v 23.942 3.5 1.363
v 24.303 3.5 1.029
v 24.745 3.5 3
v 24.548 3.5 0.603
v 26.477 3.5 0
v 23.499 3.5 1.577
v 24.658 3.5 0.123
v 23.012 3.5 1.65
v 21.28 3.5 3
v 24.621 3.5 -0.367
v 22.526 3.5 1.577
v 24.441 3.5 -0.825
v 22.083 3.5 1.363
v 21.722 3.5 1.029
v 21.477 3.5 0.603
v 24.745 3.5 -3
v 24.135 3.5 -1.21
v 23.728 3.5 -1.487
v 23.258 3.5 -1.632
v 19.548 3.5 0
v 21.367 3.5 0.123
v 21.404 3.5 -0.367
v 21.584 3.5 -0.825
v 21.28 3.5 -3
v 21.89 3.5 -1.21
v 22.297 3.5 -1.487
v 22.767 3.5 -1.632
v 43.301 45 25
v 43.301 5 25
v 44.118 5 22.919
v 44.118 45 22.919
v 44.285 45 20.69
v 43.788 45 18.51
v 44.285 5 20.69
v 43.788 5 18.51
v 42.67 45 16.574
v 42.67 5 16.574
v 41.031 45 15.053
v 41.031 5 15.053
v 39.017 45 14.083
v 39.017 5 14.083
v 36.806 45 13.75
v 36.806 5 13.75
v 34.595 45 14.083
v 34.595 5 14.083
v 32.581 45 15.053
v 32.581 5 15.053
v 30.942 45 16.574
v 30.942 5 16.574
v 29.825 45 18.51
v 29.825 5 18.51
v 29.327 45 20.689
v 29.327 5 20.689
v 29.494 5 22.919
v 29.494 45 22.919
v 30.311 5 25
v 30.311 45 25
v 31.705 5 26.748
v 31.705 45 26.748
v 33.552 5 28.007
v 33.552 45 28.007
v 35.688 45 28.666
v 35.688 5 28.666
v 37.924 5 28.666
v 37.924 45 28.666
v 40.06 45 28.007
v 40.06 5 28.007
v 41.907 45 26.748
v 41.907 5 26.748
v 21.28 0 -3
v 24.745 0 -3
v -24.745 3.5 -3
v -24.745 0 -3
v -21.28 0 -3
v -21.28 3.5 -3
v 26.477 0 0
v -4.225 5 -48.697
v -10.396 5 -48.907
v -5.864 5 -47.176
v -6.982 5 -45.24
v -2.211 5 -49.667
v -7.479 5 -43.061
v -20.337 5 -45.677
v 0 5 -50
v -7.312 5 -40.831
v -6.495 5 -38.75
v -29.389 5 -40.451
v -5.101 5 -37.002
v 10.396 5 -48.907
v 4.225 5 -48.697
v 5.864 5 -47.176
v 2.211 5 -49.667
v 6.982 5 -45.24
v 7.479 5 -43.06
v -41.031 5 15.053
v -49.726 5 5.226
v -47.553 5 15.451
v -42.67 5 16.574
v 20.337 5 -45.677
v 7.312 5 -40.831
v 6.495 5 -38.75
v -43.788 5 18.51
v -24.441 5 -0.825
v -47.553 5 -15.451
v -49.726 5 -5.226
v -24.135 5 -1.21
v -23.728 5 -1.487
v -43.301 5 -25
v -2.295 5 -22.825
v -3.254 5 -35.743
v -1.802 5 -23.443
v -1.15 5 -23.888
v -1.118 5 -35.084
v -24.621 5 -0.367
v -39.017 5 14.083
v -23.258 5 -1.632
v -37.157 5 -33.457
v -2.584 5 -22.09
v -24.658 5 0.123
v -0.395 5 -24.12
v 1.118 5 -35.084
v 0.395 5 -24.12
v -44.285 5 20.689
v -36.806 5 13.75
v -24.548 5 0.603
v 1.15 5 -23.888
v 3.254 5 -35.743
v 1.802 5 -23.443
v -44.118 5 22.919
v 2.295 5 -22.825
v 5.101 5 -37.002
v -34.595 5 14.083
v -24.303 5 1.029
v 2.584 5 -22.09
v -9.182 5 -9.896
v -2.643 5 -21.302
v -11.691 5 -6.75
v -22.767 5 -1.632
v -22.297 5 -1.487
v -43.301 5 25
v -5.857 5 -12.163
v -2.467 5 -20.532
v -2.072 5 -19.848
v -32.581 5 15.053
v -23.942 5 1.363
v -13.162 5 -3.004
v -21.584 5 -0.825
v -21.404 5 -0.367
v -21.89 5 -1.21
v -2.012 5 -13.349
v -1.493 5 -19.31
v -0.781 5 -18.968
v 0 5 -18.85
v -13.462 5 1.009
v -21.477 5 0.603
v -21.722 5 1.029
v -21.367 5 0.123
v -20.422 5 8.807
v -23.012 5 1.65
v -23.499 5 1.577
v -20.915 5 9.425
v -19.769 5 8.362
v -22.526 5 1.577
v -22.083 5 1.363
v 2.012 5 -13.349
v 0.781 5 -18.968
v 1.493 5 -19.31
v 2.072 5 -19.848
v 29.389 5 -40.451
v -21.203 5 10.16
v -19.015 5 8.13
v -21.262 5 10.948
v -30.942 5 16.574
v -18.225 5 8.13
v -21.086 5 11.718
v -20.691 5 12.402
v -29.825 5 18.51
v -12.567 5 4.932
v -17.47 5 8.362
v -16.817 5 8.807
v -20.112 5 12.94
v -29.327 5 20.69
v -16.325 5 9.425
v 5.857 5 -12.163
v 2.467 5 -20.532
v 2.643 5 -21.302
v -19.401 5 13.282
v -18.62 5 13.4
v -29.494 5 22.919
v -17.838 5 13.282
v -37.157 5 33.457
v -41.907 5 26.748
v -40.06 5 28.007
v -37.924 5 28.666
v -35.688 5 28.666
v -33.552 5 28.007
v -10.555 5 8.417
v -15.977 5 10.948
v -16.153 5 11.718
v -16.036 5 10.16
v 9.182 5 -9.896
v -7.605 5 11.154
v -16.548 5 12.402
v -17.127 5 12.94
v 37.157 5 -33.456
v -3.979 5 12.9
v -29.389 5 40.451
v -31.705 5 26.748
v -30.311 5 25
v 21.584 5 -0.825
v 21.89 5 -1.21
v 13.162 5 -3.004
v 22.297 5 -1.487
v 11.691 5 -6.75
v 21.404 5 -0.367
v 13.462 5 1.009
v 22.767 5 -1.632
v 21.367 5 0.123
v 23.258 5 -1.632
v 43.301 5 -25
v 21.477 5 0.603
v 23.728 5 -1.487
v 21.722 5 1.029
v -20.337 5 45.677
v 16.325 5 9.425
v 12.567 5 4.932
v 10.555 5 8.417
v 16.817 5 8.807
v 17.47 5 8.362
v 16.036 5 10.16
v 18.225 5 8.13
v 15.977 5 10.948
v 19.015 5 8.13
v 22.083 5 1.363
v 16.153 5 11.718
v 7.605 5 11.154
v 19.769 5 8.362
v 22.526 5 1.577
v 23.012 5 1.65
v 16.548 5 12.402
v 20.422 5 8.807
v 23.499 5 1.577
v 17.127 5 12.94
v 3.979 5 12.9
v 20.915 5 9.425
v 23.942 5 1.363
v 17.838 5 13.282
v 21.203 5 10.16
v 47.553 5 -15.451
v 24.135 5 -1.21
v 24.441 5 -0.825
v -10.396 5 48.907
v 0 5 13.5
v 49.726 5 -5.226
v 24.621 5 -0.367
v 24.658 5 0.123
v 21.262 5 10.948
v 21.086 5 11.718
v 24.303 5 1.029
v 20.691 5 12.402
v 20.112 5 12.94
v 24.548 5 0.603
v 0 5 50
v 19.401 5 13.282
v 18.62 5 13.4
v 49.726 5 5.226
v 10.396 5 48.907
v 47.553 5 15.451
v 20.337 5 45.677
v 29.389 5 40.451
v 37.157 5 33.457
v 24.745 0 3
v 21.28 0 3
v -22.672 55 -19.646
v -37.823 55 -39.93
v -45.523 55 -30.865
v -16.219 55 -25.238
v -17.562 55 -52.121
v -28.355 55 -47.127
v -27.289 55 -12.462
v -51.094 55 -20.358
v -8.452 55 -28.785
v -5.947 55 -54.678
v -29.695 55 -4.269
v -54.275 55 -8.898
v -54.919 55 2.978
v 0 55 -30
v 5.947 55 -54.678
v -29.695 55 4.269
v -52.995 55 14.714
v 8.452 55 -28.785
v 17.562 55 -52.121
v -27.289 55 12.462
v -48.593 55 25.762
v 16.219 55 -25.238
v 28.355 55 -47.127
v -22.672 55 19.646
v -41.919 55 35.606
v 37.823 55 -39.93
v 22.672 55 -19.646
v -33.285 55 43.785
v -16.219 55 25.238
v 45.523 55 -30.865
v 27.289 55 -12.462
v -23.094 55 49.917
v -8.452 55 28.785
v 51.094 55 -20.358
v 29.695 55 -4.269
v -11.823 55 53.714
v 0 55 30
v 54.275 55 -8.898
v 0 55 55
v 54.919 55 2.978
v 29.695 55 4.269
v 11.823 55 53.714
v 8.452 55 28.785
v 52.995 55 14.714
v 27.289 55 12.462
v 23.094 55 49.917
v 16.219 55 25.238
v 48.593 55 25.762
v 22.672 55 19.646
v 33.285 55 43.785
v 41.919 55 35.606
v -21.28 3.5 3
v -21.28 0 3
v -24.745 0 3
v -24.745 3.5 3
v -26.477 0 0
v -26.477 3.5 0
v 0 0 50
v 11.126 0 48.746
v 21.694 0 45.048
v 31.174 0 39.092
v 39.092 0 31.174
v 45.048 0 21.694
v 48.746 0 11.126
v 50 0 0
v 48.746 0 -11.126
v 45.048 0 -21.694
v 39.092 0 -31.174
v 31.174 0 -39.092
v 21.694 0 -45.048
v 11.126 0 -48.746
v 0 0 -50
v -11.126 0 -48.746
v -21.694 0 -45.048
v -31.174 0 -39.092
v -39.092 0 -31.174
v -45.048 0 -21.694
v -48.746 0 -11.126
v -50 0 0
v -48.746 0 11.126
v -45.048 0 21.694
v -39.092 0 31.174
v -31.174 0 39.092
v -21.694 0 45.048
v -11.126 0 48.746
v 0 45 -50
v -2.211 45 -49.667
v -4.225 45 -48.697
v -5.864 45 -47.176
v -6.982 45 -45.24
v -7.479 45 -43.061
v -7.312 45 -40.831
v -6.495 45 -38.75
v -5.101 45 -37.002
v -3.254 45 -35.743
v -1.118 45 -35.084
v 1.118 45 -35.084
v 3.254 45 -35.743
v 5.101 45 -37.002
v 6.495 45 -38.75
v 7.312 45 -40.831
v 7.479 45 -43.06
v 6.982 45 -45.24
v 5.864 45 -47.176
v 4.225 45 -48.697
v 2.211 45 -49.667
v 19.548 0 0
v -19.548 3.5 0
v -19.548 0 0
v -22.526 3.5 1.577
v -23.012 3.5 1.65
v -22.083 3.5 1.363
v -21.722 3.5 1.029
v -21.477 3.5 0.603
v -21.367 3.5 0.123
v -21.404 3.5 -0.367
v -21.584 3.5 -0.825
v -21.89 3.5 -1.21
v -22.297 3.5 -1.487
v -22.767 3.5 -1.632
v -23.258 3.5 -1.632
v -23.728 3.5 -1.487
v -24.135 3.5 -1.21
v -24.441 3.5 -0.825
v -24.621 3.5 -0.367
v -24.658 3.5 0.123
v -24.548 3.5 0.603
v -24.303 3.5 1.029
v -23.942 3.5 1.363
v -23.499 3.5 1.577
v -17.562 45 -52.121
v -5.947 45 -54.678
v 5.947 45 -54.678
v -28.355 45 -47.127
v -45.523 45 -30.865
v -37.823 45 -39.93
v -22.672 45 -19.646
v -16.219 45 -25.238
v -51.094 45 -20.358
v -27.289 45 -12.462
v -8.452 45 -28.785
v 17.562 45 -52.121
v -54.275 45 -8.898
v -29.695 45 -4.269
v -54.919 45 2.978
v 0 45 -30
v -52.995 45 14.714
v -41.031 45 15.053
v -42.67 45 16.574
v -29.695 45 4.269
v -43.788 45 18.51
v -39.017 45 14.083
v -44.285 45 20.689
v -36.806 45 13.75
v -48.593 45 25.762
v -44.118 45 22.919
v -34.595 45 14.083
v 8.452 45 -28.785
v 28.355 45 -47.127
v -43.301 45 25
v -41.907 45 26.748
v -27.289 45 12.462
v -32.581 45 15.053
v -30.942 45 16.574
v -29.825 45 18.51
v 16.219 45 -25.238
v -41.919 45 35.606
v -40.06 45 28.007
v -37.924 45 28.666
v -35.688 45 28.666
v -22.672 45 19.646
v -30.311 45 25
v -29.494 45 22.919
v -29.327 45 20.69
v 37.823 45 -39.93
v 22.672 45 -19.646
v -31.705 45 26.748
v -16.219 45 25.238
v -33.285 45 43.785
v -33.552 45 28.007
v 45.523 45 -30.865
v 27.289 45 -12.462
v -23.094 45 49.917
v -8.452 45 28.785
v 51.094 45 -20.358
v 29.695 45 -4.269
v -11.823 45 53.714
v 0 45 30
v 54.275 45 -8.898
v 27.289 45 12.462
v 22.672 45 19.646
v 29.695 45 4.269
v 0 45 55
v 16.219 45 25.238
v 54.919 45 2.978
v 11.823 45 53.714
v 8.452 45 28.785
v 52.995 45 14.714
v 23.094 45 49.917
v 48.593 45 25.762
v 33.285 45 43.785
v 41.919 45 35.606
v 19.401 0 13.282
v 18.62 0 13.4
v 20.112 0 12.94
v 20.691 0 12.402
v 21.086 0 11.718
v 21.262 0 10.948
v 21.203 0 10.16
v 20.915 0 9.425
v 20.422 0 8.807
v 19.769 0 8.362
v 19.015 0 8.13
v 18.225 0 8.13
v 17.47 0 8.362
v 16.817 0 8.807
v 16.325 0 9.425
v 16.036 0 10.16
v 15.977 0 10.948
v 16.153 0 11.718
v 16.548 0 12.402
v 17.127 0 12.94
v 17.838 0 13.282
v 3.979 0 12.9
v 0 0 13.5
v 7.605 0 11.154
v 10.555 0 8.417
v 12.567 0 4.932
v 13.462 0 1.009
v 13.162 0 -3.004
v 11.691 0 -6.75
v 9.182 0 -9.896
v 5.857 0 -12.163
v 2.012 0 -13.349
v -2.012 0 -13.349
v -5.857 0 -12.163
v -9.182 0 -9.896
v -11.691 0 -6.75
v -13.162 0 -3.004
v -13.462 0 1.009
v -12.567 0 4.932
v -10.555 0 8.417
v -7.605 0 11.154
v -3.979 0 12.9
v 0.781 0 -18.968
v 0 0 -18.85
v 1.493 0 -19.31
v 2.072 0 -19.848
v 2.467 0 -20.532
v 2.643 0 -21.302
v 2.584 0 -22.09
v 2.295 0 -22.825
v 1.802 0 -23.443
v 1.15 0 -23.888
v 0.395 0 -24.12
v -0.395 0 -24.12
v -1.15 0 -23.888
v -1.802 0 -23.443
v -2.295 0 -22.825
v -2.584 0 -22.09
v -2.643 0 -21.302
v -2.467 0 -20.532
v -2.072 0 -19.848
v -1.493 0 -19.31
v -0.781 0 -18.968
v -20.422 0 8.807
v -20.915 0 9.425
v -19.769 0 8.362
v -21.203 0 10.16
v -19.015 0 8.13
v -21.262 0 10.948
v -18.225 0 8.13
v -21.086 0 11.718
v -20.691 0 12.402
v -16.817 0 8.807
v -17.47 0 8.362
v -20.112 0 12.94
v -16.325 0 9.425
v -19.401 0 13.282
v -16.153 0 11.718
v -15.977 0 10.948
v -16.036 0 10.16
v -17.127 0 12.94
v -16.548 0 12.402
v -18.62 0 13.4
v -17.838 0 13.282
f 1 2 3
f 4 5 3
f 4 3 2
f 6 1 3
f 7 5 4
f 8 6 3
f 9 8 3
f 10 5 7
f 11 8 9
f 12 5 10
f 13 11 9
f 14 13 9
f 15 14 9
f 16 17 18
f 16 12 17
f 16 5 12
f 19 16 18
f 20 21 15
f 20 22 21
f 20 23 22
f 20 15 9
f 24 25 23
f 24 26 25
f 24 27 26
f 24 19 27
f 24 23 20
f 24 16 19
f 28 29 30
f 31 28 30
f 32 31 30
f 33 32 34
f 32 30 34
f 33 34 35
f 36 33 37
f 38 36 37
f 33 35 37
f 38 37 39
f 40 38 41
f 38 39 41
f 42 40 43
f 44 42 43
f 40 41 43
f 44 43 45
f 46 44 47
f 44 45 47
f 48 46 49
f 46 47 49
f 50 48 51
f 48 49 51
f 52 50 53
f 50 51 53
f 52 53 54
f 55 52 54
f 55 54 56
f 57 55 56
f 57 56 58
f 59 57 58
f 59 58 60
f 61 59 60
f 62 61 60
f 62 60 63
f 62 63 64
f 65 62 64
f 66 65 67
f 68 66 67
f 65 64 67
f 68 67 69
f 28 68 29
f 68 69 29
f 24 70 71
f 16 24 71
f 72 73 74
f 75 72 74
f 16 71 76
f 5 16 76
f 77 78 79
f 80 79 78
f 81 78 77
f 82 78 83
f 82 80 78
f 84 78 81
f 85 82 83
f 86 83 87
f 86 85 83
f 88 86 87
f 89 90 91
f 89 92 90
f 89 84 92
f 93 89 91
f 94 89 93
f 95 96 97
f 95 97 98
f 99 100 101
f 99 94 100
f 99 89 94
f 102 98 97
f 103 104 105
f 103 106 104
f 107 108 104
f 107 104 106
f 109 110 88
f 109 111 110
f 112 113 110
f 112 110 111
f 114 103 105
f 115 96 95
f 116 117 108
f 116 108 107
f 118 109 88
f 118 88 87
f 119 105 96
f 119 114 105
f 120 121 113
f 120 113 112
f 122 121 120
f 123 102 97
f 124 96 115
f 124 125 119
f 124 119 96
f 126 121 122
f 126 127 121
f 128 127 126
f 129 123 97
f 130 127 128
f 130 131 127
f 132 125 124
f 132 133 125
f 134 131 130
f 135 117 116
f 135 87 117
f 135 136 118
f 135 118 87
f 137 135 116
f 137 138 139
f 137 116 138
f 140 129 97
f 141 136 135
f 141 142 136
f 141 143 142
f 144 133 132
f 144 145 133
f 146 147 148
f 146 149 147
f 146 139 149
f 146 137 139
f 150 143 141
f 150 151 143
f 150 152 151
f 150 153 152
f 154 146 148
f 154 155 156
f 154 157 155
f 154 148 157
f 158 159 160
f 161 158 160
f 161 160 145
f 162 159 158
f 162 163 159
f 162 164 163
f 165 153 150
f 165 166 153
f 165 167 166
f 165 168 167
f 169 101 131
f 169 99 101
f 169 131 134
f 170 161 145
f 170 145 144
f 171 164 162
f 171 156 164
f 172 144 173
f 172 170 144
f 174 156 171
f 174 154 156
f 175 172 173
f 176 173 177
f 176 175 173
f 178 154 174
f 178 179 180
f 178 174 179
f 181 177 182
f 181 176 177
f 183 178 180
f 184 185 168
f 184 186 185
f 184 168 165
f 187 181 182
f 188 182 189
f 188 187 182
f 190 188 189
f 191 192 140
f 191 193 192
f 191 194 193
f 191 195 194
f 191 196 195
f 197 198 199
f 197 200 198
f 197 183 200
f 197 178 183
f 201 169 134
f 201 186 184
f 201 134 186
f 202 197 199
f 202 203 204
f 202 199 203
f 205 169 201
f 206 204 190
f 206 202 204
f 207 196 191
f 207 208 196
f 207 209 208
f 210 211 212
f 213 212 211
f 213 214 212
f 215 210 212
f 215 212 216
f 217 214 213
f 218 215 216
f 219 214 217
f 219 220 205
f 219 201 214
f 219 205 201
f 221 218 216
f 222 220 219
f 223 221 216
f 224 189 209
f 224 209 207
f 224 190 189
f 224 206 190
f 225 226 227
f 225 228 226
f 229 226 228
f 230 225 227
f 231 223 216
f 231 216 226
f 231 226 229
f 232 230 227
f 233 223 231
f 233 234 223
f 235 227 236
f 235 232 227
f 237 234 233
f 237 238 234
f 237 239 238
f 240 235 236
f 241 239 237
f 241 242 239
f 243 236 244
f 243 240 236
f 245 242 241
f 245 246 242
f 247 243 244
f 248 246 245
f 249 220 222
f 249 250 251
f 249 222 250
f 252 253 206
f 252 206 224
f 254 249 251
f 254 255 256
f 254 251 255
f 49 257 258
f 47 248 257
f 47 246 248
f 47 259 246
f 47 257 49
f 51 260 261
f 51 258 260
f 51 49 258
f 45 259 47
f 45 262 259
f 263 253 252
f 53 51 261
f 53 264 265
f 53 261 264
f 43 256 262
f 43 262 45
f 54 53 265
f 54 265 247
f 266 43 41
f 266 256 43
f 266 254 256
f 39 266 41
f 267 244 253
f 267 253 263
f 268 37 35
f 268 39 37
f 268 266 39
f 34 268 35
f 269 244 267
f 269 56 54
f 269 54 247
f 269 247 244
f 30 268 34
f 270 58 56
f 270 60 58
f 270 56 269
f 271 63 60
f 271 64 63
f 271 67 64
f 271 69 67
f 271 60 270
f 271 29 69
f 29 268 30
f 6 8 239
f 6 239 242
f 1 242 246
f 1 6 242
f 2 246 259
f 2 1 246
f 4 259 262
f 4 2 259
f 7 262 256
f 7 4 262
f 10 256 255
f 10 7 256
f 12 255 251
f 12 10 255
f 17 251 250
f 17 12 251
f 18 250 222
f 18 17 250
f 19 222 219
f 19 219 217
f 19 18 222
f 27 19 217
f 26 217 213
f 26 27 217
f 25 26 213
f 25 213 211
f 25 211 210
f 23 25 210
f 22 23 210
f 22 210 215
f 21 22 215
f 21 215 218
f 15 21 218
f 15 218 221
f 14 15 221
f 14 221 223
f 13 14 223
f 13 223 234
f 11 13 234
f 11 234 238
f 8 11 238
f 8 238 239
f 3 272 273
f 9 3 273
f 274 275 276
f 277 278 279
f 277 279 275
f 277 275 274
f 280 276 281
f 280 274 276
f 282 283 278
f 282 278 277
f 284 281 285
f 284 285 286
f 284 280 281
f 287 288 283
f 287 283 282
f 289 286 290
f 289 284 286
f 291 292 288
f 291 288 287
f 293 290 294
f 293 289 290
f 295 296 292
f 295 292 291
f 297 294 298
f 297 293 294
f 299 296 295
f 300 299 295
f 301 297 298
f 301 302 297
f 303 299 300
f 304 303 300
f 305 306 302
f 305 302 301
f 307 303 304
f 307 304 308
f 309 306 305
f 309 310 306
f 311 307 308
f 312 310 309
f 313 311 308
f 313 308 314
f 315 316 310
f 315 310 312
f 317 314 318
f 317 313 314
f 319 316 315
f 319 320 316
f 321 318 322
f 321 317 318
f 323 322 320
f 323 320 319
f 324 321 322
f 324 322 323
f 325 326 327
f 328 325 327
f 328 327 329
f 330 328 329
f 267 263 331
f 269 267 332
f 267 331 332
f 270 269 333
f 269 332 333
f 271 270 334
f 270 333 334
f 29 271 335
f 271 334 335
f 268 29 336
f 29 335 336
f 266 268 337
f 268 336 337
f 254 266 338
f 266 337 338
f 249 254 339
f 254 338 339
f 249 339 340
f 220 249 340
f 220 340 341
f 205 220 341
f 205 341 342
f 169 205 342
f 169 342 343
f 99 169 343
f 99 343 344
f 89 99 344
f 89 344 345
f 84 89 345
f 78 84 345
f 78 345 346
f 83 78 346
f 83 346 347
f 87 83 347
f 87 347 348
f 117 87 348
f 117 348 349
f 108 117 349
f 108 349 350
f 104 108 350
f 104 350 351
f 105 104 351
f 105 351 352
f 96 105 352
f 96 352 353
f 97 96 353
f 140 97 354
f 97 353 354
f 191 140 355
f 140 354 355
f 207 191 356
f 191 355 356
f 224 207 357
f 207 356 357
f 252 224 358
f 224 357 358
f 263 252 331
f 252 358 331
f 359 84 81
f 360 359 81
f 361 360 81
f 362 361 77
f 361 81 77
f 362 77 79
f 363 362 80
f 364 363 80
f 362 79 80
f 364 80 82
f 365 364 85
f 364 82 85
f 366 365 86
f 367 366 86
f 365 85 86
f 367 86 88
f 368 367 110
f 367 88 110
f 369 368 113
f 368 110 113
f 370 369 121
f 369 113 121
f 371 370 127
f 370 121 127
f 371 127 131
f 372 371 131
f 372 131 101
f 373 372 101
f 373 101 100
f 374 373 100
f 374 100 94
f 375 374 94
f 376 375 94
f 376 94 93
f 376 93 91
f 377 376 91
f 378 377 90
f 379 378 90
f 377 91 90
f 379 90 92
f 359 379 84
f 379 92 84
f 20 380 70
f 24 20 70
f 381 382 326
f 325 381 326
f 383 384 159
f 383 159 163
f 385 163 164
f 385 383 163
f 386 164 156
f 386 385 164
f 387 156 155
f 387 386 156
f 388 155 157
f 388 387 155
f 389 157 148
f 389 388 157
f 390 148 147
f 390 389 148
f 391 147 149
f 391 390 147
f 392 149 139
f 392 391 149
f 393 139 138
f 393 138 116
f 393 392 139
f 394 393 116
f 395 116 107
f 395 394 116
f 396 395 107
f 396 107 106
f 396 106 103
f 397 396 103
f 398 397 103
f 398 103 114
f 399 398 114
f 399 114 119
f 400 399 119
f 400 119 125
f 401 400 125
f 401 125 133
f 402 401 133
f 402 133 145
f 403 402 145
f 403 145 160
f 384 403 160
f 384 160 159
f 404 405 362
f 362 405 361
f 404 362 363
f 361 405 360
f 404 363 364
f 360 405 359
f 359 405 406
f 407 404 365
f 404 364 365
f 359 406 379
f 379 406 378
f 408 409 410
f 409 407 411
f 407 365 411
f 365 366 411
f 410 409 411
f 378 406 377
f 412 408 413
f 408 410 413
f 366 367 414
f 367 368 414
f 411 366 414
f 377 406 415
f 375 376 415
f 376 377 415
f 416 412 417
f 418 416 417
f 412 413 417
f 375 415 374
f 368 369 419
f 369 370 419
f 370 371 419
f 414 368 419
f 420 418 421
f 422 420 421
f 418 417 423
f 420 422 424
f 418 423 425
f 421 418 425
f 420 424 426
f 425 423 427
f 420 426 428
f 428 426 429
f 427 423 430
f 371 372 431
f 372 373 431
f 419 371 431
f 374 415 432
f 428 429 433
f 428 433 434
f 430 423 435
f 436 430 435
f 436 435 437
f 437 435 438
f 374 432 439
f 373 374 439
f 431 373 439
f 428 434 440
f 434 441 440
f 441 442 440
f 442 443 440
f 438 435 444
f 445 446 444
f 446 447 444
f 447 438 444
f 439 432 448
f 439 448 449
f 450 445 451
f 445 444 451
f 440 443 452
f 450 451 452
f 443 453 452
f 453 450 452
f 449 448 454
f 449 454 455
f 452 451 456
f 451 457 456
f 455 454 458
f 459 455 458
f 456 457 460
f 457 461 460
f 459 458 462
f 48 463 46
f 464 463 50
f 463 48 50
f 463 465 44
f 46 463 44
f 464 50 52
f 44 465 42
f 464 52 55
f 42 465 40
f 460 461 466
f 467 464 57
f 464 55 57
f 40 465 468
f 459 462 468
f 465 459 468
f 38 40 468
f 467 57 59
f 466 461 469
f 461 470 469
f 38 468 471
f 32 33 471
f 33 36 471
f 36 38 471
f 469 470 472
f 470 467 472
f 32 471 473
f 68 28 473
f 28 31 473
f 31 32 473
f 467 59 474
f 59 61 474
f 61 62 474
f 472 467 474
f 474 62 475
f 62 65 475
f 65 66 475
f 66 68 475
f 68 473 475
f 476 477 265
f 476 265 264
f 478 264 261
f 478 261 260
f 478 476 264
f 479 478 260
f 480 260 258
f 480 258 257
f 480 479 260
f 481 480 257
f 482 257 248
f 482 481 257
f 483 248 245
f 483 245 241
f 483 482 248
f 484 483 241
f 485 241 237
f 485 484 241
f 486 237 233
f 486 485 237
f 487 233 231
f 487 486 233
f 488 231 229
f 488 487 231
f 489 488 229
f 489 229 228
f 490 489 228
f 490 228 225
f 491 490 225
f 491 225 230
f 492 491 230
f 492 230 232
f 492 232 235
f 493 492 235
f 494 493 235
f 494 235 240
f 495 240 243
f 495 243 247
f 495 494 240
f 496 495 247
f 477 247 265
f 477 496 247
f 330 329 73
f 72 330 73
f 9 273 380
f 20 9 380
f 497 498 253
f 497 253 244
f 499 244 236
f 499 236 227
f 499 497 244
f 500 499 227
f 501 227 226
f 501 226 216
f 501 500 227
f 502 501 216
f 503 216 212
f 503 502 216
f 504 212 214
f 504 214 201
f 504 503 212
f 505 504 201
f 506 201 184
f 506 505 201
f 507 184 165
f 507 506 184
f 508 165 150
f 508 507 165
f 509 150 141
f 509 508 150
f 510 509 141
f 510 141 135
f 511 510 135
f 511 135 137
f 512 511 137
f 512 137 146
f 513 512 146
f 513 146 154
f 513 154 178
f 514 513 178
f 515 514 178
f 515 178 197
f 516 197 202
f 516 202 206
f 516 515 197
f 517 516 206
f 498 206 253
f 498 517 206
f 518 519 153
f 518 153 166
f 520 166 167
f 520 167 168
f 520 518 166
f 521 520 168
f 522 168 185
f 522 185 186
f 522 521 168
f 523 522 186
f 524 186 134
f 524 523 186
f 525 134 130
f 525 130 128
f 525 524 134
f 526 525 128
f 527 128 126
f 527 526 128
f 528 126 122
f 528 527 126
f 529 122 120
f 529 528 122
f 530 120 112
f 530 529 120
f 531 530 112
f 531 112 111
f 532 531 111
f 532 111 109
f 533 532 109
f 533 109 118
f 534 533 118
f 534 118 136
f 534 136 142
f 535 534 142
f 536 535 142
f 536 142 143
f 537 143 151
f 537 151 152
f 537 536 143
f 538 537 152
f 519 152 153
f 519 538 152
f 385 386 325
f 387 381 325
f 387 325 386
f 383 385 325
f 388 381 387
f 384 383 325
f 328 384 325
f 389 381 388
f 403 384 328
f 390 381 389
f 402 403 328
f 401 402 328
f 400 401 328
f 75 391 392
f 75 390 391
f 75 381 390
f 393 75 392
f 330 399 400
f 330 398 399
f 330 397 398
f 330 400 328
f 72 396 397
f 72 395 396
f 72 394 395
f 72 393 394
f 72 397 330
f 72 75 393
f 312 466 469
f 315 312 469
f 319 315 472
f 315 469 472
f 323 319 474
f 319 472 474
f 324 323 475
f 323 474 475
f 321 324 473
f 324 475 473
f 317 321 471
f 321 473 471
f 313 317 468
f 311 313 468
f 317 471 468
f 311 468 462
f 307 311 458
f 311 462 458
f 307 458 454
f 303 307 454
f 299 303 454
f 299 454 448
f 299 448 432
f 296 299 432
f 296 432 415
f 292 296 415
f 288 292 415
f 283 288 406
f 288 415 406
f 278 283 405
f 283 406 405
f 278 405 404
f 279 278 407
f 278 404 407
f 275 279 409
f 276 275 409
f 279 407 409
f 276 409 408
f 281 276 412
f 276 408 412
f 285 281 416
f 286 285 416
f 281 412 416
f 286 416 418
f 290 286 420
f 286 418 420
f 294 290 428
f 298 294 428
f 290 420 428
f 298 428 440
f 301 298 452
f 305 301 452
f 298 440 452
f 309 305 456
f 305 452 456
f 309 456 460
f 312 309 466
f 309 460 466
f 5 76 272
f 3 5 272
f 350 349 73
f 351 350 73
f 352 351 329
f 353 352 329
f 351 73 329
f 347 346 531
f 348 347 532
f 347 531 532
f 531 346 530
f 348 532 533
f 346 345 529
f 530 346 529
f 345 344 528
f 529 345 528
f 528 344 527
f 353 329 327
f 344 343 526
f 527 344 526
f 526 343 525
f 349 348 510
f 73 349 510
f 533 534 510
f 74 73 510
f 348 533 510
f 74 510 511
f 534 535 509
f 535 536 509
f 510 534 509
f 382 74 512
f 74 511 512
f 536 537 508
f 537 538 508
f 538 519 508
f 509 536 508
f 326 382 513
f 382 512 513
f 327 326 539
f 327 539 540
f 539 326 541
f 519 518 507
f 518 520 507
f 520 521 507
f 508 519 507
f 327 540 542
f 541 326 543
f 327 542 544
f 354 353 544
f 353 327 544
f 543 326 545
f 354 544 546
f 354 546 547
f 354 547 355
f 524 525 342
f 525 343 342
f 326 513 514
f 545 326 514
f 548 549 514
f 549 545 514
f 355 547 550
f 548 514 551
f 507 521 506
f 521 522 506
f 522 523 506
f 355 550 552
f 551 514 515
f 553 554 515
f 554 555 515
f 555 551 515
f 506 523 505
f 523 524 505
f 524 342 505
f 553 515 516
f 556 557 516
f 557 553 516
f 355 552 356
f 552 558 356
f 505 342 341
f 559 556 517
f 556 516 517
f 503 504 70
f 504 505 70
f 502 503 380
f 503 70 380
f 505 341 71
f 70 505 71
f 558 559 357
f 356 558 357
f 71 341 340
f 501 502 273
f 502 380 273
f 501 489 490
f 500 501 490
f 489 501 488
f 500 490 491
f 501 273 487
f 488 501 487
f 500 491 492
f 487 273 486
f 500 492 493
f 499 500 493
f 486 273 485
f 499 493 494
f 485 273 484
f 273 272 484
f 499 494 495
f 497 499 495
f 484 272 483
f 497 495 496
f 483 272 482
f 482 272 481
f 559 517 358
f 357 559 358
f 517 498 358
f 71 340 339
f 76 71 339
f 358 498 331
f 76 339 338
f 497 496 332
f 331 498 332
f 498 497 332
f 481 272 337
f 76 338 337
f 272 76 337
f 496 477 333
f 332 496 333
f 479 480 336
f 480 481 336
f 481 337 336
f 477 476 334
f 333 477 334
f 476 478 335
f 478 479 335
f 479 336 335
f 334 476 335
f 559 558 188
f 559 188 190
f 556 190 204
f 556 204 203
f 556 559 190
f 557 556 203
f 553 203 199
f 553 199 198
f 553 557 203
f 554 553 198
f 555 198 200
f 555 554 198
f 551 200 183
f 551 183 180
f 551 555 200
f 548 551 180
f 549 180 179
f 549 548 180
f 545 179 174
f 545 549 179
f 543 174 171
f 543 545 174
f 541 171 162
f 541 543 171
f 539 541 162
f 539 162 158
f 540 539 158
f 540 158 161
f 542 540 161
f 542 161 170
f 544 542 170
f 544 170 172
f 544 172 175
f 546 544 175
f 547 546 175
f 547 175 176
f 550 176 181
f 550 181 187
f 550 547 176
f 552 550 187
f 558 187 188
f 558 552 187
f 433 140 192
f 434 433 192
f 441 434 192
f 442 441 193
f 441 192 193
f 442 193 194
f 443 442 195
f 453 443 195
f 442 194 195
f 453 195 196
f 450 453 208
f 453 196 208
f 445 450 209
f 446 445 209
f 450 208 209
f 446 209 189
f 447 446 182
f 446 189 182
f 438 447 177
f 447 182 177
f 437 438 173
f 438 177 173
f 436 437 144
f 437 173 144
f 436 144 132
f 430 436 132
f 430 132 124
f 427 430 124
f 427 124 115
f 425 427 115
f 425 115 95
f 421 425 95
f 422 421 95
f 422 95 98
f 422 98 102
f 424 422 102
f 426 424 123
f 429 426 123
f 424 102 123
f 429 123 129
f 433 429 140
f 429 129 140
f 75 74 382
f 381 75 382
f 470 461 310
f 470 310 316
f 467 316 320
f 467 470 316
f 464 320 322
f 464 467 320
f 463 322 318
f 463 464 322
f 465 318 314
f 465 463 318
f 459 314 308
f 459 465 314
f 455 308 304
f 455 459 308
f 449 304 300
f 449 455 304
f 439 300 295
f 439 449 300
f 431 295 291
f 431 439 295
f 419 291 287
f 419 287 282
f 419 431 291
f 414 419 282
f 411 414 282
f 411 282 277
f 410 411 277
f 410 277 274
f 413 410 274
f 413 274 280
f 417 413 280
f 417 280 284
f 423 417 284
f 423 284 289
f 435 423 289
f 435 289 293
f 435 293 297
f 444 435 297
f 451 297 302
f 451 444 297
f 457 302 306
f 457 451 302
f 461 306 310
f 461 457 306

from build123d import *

# Parameters (mm, degrees)
SKETCH1_R           = 50
SKETCH1_R_2         = 13.5
SKETCH1_R_3         = 2.65
SKETCH1_R_4         = 1.65
BOSS_EXTRUDE1_DEPTH = 5
SKETCH3_R           = 7.5
BOSS_EXTRUDE2_DEPTH = 40
SKETCH4_R           = 55
SKETCH4_R_2         = 30
BOSS_EXTRUDE3_DEPTH = 10
CUT_EXTRUDE1_DEPTH  = 3.5


with BuildPart() as part:
    # Sketch1 → Boss-Extrude1 (new body)
    with BuildSketch(Plane(origin=(0, 0, 0), x_dir=(1, 0, 0), z_dir=(0, 1, 0))):
        with Locations(Location((0, 0, 0), (0, 0, 270))):
            Circle(SKETCH1_R)
        with Locations(Location((0, 0, 0), (0, 0, 270))):
            Circle(SKETCH1_R_2, mode=Mode.SUBTRACT)
        with Locations(Location((0, 21.5, 0), (0, 0, 270))):
            Circle(SKETCH1_R_3, mode=Mode.SUBTRACT)
        with Locations(Location((23.0125, 0, 0), (0, 0, 270))):
            Circle(SKETCH1_R_4, mode=Mode.SUBTRACT)
        with Locations(Location((-23.0125, 0, 0), (0, 0, 270))):
            Circle(SKETCH1_R_4, mode=Mode.SUBTRACT)
        with Locations(Location((18.619546181, -10.75, 0), (0, 0, 270))):
            Circle(SKETCH1_R_3, mode=Mode.SUBTRACT)
        with Locations(Location((-18.619546181, -10.75, 0), (0, 0, 270))):
            Circle(SKETCH1_R_3, mode=Mode.SUBTRACT)
    extrude(amount=BOSS_EXTRUDE1_DEPTH)

    # Sketch3 → Boss-Extrude2 (add)
    with BuildSketch(Plane(origin=(0, 5, 0), x_dir=(1, 0, 0), z_dir=(0, 1, 0))):
        with Locations(Location((0, 42.5, 0), (0, 0, 89.99967908))):
            Circle(SKETCH3_R)
        with Locations(Location((36.806079661, -21.25, 0), (0, 0, 329.999669783))):
            Circle(SKETCH3_R)
        with Locations(Location((-36.806079661, -21.25, 0), (0, 0, 209.999673972))):
            Circle(SKETCH3_R)
    extrude(amount=BOSS_EXTRUDE2_DEPTH)

    # Sketch4 → Boss-Extrude3 (add)
    with BuildSketch(Plane(origin=(0, 45, 0), x_dir=(1, 0, 0), z_dir=(0, 1, 0))):
        with Locations(Location((0, 0, 0), (0, 0, 270))):
            Circle(SKETCH4_R)
        with Locations(Location((0, 0, 0), (0, 0, 270))):
            Circle(SKETCH4_R_2, mode=Mode.SUBTRACT)
    extrude(amount=BOSS_EXTRUDE3_DEPTH)

    # Sketch5 → Cut-Extrude1 (cut)
    with BuildSketch(Plane(origin=(0, 0, 0), x_dir=(-1, 0, 0), z_dir=(0, -1, 0))):
        Polygon((-26.476601615, 0), (-24.744550808, -3), (-21.280449192, -3), (-19.548398385, 0), (-21.280449192, 3), (-24.744550808, 3), align=None)
        Polygon((26.476601615, 0), (24.744550808, 3), (21.280449192, 3), (19.548398385, 0), (21.280449192, -3), (24.744550808, -3), align=None)
    extrude(amount=-CUT_EXTRUDE1_DEPTH, mode=Mode.SUBTRACT)


solid = part.part
